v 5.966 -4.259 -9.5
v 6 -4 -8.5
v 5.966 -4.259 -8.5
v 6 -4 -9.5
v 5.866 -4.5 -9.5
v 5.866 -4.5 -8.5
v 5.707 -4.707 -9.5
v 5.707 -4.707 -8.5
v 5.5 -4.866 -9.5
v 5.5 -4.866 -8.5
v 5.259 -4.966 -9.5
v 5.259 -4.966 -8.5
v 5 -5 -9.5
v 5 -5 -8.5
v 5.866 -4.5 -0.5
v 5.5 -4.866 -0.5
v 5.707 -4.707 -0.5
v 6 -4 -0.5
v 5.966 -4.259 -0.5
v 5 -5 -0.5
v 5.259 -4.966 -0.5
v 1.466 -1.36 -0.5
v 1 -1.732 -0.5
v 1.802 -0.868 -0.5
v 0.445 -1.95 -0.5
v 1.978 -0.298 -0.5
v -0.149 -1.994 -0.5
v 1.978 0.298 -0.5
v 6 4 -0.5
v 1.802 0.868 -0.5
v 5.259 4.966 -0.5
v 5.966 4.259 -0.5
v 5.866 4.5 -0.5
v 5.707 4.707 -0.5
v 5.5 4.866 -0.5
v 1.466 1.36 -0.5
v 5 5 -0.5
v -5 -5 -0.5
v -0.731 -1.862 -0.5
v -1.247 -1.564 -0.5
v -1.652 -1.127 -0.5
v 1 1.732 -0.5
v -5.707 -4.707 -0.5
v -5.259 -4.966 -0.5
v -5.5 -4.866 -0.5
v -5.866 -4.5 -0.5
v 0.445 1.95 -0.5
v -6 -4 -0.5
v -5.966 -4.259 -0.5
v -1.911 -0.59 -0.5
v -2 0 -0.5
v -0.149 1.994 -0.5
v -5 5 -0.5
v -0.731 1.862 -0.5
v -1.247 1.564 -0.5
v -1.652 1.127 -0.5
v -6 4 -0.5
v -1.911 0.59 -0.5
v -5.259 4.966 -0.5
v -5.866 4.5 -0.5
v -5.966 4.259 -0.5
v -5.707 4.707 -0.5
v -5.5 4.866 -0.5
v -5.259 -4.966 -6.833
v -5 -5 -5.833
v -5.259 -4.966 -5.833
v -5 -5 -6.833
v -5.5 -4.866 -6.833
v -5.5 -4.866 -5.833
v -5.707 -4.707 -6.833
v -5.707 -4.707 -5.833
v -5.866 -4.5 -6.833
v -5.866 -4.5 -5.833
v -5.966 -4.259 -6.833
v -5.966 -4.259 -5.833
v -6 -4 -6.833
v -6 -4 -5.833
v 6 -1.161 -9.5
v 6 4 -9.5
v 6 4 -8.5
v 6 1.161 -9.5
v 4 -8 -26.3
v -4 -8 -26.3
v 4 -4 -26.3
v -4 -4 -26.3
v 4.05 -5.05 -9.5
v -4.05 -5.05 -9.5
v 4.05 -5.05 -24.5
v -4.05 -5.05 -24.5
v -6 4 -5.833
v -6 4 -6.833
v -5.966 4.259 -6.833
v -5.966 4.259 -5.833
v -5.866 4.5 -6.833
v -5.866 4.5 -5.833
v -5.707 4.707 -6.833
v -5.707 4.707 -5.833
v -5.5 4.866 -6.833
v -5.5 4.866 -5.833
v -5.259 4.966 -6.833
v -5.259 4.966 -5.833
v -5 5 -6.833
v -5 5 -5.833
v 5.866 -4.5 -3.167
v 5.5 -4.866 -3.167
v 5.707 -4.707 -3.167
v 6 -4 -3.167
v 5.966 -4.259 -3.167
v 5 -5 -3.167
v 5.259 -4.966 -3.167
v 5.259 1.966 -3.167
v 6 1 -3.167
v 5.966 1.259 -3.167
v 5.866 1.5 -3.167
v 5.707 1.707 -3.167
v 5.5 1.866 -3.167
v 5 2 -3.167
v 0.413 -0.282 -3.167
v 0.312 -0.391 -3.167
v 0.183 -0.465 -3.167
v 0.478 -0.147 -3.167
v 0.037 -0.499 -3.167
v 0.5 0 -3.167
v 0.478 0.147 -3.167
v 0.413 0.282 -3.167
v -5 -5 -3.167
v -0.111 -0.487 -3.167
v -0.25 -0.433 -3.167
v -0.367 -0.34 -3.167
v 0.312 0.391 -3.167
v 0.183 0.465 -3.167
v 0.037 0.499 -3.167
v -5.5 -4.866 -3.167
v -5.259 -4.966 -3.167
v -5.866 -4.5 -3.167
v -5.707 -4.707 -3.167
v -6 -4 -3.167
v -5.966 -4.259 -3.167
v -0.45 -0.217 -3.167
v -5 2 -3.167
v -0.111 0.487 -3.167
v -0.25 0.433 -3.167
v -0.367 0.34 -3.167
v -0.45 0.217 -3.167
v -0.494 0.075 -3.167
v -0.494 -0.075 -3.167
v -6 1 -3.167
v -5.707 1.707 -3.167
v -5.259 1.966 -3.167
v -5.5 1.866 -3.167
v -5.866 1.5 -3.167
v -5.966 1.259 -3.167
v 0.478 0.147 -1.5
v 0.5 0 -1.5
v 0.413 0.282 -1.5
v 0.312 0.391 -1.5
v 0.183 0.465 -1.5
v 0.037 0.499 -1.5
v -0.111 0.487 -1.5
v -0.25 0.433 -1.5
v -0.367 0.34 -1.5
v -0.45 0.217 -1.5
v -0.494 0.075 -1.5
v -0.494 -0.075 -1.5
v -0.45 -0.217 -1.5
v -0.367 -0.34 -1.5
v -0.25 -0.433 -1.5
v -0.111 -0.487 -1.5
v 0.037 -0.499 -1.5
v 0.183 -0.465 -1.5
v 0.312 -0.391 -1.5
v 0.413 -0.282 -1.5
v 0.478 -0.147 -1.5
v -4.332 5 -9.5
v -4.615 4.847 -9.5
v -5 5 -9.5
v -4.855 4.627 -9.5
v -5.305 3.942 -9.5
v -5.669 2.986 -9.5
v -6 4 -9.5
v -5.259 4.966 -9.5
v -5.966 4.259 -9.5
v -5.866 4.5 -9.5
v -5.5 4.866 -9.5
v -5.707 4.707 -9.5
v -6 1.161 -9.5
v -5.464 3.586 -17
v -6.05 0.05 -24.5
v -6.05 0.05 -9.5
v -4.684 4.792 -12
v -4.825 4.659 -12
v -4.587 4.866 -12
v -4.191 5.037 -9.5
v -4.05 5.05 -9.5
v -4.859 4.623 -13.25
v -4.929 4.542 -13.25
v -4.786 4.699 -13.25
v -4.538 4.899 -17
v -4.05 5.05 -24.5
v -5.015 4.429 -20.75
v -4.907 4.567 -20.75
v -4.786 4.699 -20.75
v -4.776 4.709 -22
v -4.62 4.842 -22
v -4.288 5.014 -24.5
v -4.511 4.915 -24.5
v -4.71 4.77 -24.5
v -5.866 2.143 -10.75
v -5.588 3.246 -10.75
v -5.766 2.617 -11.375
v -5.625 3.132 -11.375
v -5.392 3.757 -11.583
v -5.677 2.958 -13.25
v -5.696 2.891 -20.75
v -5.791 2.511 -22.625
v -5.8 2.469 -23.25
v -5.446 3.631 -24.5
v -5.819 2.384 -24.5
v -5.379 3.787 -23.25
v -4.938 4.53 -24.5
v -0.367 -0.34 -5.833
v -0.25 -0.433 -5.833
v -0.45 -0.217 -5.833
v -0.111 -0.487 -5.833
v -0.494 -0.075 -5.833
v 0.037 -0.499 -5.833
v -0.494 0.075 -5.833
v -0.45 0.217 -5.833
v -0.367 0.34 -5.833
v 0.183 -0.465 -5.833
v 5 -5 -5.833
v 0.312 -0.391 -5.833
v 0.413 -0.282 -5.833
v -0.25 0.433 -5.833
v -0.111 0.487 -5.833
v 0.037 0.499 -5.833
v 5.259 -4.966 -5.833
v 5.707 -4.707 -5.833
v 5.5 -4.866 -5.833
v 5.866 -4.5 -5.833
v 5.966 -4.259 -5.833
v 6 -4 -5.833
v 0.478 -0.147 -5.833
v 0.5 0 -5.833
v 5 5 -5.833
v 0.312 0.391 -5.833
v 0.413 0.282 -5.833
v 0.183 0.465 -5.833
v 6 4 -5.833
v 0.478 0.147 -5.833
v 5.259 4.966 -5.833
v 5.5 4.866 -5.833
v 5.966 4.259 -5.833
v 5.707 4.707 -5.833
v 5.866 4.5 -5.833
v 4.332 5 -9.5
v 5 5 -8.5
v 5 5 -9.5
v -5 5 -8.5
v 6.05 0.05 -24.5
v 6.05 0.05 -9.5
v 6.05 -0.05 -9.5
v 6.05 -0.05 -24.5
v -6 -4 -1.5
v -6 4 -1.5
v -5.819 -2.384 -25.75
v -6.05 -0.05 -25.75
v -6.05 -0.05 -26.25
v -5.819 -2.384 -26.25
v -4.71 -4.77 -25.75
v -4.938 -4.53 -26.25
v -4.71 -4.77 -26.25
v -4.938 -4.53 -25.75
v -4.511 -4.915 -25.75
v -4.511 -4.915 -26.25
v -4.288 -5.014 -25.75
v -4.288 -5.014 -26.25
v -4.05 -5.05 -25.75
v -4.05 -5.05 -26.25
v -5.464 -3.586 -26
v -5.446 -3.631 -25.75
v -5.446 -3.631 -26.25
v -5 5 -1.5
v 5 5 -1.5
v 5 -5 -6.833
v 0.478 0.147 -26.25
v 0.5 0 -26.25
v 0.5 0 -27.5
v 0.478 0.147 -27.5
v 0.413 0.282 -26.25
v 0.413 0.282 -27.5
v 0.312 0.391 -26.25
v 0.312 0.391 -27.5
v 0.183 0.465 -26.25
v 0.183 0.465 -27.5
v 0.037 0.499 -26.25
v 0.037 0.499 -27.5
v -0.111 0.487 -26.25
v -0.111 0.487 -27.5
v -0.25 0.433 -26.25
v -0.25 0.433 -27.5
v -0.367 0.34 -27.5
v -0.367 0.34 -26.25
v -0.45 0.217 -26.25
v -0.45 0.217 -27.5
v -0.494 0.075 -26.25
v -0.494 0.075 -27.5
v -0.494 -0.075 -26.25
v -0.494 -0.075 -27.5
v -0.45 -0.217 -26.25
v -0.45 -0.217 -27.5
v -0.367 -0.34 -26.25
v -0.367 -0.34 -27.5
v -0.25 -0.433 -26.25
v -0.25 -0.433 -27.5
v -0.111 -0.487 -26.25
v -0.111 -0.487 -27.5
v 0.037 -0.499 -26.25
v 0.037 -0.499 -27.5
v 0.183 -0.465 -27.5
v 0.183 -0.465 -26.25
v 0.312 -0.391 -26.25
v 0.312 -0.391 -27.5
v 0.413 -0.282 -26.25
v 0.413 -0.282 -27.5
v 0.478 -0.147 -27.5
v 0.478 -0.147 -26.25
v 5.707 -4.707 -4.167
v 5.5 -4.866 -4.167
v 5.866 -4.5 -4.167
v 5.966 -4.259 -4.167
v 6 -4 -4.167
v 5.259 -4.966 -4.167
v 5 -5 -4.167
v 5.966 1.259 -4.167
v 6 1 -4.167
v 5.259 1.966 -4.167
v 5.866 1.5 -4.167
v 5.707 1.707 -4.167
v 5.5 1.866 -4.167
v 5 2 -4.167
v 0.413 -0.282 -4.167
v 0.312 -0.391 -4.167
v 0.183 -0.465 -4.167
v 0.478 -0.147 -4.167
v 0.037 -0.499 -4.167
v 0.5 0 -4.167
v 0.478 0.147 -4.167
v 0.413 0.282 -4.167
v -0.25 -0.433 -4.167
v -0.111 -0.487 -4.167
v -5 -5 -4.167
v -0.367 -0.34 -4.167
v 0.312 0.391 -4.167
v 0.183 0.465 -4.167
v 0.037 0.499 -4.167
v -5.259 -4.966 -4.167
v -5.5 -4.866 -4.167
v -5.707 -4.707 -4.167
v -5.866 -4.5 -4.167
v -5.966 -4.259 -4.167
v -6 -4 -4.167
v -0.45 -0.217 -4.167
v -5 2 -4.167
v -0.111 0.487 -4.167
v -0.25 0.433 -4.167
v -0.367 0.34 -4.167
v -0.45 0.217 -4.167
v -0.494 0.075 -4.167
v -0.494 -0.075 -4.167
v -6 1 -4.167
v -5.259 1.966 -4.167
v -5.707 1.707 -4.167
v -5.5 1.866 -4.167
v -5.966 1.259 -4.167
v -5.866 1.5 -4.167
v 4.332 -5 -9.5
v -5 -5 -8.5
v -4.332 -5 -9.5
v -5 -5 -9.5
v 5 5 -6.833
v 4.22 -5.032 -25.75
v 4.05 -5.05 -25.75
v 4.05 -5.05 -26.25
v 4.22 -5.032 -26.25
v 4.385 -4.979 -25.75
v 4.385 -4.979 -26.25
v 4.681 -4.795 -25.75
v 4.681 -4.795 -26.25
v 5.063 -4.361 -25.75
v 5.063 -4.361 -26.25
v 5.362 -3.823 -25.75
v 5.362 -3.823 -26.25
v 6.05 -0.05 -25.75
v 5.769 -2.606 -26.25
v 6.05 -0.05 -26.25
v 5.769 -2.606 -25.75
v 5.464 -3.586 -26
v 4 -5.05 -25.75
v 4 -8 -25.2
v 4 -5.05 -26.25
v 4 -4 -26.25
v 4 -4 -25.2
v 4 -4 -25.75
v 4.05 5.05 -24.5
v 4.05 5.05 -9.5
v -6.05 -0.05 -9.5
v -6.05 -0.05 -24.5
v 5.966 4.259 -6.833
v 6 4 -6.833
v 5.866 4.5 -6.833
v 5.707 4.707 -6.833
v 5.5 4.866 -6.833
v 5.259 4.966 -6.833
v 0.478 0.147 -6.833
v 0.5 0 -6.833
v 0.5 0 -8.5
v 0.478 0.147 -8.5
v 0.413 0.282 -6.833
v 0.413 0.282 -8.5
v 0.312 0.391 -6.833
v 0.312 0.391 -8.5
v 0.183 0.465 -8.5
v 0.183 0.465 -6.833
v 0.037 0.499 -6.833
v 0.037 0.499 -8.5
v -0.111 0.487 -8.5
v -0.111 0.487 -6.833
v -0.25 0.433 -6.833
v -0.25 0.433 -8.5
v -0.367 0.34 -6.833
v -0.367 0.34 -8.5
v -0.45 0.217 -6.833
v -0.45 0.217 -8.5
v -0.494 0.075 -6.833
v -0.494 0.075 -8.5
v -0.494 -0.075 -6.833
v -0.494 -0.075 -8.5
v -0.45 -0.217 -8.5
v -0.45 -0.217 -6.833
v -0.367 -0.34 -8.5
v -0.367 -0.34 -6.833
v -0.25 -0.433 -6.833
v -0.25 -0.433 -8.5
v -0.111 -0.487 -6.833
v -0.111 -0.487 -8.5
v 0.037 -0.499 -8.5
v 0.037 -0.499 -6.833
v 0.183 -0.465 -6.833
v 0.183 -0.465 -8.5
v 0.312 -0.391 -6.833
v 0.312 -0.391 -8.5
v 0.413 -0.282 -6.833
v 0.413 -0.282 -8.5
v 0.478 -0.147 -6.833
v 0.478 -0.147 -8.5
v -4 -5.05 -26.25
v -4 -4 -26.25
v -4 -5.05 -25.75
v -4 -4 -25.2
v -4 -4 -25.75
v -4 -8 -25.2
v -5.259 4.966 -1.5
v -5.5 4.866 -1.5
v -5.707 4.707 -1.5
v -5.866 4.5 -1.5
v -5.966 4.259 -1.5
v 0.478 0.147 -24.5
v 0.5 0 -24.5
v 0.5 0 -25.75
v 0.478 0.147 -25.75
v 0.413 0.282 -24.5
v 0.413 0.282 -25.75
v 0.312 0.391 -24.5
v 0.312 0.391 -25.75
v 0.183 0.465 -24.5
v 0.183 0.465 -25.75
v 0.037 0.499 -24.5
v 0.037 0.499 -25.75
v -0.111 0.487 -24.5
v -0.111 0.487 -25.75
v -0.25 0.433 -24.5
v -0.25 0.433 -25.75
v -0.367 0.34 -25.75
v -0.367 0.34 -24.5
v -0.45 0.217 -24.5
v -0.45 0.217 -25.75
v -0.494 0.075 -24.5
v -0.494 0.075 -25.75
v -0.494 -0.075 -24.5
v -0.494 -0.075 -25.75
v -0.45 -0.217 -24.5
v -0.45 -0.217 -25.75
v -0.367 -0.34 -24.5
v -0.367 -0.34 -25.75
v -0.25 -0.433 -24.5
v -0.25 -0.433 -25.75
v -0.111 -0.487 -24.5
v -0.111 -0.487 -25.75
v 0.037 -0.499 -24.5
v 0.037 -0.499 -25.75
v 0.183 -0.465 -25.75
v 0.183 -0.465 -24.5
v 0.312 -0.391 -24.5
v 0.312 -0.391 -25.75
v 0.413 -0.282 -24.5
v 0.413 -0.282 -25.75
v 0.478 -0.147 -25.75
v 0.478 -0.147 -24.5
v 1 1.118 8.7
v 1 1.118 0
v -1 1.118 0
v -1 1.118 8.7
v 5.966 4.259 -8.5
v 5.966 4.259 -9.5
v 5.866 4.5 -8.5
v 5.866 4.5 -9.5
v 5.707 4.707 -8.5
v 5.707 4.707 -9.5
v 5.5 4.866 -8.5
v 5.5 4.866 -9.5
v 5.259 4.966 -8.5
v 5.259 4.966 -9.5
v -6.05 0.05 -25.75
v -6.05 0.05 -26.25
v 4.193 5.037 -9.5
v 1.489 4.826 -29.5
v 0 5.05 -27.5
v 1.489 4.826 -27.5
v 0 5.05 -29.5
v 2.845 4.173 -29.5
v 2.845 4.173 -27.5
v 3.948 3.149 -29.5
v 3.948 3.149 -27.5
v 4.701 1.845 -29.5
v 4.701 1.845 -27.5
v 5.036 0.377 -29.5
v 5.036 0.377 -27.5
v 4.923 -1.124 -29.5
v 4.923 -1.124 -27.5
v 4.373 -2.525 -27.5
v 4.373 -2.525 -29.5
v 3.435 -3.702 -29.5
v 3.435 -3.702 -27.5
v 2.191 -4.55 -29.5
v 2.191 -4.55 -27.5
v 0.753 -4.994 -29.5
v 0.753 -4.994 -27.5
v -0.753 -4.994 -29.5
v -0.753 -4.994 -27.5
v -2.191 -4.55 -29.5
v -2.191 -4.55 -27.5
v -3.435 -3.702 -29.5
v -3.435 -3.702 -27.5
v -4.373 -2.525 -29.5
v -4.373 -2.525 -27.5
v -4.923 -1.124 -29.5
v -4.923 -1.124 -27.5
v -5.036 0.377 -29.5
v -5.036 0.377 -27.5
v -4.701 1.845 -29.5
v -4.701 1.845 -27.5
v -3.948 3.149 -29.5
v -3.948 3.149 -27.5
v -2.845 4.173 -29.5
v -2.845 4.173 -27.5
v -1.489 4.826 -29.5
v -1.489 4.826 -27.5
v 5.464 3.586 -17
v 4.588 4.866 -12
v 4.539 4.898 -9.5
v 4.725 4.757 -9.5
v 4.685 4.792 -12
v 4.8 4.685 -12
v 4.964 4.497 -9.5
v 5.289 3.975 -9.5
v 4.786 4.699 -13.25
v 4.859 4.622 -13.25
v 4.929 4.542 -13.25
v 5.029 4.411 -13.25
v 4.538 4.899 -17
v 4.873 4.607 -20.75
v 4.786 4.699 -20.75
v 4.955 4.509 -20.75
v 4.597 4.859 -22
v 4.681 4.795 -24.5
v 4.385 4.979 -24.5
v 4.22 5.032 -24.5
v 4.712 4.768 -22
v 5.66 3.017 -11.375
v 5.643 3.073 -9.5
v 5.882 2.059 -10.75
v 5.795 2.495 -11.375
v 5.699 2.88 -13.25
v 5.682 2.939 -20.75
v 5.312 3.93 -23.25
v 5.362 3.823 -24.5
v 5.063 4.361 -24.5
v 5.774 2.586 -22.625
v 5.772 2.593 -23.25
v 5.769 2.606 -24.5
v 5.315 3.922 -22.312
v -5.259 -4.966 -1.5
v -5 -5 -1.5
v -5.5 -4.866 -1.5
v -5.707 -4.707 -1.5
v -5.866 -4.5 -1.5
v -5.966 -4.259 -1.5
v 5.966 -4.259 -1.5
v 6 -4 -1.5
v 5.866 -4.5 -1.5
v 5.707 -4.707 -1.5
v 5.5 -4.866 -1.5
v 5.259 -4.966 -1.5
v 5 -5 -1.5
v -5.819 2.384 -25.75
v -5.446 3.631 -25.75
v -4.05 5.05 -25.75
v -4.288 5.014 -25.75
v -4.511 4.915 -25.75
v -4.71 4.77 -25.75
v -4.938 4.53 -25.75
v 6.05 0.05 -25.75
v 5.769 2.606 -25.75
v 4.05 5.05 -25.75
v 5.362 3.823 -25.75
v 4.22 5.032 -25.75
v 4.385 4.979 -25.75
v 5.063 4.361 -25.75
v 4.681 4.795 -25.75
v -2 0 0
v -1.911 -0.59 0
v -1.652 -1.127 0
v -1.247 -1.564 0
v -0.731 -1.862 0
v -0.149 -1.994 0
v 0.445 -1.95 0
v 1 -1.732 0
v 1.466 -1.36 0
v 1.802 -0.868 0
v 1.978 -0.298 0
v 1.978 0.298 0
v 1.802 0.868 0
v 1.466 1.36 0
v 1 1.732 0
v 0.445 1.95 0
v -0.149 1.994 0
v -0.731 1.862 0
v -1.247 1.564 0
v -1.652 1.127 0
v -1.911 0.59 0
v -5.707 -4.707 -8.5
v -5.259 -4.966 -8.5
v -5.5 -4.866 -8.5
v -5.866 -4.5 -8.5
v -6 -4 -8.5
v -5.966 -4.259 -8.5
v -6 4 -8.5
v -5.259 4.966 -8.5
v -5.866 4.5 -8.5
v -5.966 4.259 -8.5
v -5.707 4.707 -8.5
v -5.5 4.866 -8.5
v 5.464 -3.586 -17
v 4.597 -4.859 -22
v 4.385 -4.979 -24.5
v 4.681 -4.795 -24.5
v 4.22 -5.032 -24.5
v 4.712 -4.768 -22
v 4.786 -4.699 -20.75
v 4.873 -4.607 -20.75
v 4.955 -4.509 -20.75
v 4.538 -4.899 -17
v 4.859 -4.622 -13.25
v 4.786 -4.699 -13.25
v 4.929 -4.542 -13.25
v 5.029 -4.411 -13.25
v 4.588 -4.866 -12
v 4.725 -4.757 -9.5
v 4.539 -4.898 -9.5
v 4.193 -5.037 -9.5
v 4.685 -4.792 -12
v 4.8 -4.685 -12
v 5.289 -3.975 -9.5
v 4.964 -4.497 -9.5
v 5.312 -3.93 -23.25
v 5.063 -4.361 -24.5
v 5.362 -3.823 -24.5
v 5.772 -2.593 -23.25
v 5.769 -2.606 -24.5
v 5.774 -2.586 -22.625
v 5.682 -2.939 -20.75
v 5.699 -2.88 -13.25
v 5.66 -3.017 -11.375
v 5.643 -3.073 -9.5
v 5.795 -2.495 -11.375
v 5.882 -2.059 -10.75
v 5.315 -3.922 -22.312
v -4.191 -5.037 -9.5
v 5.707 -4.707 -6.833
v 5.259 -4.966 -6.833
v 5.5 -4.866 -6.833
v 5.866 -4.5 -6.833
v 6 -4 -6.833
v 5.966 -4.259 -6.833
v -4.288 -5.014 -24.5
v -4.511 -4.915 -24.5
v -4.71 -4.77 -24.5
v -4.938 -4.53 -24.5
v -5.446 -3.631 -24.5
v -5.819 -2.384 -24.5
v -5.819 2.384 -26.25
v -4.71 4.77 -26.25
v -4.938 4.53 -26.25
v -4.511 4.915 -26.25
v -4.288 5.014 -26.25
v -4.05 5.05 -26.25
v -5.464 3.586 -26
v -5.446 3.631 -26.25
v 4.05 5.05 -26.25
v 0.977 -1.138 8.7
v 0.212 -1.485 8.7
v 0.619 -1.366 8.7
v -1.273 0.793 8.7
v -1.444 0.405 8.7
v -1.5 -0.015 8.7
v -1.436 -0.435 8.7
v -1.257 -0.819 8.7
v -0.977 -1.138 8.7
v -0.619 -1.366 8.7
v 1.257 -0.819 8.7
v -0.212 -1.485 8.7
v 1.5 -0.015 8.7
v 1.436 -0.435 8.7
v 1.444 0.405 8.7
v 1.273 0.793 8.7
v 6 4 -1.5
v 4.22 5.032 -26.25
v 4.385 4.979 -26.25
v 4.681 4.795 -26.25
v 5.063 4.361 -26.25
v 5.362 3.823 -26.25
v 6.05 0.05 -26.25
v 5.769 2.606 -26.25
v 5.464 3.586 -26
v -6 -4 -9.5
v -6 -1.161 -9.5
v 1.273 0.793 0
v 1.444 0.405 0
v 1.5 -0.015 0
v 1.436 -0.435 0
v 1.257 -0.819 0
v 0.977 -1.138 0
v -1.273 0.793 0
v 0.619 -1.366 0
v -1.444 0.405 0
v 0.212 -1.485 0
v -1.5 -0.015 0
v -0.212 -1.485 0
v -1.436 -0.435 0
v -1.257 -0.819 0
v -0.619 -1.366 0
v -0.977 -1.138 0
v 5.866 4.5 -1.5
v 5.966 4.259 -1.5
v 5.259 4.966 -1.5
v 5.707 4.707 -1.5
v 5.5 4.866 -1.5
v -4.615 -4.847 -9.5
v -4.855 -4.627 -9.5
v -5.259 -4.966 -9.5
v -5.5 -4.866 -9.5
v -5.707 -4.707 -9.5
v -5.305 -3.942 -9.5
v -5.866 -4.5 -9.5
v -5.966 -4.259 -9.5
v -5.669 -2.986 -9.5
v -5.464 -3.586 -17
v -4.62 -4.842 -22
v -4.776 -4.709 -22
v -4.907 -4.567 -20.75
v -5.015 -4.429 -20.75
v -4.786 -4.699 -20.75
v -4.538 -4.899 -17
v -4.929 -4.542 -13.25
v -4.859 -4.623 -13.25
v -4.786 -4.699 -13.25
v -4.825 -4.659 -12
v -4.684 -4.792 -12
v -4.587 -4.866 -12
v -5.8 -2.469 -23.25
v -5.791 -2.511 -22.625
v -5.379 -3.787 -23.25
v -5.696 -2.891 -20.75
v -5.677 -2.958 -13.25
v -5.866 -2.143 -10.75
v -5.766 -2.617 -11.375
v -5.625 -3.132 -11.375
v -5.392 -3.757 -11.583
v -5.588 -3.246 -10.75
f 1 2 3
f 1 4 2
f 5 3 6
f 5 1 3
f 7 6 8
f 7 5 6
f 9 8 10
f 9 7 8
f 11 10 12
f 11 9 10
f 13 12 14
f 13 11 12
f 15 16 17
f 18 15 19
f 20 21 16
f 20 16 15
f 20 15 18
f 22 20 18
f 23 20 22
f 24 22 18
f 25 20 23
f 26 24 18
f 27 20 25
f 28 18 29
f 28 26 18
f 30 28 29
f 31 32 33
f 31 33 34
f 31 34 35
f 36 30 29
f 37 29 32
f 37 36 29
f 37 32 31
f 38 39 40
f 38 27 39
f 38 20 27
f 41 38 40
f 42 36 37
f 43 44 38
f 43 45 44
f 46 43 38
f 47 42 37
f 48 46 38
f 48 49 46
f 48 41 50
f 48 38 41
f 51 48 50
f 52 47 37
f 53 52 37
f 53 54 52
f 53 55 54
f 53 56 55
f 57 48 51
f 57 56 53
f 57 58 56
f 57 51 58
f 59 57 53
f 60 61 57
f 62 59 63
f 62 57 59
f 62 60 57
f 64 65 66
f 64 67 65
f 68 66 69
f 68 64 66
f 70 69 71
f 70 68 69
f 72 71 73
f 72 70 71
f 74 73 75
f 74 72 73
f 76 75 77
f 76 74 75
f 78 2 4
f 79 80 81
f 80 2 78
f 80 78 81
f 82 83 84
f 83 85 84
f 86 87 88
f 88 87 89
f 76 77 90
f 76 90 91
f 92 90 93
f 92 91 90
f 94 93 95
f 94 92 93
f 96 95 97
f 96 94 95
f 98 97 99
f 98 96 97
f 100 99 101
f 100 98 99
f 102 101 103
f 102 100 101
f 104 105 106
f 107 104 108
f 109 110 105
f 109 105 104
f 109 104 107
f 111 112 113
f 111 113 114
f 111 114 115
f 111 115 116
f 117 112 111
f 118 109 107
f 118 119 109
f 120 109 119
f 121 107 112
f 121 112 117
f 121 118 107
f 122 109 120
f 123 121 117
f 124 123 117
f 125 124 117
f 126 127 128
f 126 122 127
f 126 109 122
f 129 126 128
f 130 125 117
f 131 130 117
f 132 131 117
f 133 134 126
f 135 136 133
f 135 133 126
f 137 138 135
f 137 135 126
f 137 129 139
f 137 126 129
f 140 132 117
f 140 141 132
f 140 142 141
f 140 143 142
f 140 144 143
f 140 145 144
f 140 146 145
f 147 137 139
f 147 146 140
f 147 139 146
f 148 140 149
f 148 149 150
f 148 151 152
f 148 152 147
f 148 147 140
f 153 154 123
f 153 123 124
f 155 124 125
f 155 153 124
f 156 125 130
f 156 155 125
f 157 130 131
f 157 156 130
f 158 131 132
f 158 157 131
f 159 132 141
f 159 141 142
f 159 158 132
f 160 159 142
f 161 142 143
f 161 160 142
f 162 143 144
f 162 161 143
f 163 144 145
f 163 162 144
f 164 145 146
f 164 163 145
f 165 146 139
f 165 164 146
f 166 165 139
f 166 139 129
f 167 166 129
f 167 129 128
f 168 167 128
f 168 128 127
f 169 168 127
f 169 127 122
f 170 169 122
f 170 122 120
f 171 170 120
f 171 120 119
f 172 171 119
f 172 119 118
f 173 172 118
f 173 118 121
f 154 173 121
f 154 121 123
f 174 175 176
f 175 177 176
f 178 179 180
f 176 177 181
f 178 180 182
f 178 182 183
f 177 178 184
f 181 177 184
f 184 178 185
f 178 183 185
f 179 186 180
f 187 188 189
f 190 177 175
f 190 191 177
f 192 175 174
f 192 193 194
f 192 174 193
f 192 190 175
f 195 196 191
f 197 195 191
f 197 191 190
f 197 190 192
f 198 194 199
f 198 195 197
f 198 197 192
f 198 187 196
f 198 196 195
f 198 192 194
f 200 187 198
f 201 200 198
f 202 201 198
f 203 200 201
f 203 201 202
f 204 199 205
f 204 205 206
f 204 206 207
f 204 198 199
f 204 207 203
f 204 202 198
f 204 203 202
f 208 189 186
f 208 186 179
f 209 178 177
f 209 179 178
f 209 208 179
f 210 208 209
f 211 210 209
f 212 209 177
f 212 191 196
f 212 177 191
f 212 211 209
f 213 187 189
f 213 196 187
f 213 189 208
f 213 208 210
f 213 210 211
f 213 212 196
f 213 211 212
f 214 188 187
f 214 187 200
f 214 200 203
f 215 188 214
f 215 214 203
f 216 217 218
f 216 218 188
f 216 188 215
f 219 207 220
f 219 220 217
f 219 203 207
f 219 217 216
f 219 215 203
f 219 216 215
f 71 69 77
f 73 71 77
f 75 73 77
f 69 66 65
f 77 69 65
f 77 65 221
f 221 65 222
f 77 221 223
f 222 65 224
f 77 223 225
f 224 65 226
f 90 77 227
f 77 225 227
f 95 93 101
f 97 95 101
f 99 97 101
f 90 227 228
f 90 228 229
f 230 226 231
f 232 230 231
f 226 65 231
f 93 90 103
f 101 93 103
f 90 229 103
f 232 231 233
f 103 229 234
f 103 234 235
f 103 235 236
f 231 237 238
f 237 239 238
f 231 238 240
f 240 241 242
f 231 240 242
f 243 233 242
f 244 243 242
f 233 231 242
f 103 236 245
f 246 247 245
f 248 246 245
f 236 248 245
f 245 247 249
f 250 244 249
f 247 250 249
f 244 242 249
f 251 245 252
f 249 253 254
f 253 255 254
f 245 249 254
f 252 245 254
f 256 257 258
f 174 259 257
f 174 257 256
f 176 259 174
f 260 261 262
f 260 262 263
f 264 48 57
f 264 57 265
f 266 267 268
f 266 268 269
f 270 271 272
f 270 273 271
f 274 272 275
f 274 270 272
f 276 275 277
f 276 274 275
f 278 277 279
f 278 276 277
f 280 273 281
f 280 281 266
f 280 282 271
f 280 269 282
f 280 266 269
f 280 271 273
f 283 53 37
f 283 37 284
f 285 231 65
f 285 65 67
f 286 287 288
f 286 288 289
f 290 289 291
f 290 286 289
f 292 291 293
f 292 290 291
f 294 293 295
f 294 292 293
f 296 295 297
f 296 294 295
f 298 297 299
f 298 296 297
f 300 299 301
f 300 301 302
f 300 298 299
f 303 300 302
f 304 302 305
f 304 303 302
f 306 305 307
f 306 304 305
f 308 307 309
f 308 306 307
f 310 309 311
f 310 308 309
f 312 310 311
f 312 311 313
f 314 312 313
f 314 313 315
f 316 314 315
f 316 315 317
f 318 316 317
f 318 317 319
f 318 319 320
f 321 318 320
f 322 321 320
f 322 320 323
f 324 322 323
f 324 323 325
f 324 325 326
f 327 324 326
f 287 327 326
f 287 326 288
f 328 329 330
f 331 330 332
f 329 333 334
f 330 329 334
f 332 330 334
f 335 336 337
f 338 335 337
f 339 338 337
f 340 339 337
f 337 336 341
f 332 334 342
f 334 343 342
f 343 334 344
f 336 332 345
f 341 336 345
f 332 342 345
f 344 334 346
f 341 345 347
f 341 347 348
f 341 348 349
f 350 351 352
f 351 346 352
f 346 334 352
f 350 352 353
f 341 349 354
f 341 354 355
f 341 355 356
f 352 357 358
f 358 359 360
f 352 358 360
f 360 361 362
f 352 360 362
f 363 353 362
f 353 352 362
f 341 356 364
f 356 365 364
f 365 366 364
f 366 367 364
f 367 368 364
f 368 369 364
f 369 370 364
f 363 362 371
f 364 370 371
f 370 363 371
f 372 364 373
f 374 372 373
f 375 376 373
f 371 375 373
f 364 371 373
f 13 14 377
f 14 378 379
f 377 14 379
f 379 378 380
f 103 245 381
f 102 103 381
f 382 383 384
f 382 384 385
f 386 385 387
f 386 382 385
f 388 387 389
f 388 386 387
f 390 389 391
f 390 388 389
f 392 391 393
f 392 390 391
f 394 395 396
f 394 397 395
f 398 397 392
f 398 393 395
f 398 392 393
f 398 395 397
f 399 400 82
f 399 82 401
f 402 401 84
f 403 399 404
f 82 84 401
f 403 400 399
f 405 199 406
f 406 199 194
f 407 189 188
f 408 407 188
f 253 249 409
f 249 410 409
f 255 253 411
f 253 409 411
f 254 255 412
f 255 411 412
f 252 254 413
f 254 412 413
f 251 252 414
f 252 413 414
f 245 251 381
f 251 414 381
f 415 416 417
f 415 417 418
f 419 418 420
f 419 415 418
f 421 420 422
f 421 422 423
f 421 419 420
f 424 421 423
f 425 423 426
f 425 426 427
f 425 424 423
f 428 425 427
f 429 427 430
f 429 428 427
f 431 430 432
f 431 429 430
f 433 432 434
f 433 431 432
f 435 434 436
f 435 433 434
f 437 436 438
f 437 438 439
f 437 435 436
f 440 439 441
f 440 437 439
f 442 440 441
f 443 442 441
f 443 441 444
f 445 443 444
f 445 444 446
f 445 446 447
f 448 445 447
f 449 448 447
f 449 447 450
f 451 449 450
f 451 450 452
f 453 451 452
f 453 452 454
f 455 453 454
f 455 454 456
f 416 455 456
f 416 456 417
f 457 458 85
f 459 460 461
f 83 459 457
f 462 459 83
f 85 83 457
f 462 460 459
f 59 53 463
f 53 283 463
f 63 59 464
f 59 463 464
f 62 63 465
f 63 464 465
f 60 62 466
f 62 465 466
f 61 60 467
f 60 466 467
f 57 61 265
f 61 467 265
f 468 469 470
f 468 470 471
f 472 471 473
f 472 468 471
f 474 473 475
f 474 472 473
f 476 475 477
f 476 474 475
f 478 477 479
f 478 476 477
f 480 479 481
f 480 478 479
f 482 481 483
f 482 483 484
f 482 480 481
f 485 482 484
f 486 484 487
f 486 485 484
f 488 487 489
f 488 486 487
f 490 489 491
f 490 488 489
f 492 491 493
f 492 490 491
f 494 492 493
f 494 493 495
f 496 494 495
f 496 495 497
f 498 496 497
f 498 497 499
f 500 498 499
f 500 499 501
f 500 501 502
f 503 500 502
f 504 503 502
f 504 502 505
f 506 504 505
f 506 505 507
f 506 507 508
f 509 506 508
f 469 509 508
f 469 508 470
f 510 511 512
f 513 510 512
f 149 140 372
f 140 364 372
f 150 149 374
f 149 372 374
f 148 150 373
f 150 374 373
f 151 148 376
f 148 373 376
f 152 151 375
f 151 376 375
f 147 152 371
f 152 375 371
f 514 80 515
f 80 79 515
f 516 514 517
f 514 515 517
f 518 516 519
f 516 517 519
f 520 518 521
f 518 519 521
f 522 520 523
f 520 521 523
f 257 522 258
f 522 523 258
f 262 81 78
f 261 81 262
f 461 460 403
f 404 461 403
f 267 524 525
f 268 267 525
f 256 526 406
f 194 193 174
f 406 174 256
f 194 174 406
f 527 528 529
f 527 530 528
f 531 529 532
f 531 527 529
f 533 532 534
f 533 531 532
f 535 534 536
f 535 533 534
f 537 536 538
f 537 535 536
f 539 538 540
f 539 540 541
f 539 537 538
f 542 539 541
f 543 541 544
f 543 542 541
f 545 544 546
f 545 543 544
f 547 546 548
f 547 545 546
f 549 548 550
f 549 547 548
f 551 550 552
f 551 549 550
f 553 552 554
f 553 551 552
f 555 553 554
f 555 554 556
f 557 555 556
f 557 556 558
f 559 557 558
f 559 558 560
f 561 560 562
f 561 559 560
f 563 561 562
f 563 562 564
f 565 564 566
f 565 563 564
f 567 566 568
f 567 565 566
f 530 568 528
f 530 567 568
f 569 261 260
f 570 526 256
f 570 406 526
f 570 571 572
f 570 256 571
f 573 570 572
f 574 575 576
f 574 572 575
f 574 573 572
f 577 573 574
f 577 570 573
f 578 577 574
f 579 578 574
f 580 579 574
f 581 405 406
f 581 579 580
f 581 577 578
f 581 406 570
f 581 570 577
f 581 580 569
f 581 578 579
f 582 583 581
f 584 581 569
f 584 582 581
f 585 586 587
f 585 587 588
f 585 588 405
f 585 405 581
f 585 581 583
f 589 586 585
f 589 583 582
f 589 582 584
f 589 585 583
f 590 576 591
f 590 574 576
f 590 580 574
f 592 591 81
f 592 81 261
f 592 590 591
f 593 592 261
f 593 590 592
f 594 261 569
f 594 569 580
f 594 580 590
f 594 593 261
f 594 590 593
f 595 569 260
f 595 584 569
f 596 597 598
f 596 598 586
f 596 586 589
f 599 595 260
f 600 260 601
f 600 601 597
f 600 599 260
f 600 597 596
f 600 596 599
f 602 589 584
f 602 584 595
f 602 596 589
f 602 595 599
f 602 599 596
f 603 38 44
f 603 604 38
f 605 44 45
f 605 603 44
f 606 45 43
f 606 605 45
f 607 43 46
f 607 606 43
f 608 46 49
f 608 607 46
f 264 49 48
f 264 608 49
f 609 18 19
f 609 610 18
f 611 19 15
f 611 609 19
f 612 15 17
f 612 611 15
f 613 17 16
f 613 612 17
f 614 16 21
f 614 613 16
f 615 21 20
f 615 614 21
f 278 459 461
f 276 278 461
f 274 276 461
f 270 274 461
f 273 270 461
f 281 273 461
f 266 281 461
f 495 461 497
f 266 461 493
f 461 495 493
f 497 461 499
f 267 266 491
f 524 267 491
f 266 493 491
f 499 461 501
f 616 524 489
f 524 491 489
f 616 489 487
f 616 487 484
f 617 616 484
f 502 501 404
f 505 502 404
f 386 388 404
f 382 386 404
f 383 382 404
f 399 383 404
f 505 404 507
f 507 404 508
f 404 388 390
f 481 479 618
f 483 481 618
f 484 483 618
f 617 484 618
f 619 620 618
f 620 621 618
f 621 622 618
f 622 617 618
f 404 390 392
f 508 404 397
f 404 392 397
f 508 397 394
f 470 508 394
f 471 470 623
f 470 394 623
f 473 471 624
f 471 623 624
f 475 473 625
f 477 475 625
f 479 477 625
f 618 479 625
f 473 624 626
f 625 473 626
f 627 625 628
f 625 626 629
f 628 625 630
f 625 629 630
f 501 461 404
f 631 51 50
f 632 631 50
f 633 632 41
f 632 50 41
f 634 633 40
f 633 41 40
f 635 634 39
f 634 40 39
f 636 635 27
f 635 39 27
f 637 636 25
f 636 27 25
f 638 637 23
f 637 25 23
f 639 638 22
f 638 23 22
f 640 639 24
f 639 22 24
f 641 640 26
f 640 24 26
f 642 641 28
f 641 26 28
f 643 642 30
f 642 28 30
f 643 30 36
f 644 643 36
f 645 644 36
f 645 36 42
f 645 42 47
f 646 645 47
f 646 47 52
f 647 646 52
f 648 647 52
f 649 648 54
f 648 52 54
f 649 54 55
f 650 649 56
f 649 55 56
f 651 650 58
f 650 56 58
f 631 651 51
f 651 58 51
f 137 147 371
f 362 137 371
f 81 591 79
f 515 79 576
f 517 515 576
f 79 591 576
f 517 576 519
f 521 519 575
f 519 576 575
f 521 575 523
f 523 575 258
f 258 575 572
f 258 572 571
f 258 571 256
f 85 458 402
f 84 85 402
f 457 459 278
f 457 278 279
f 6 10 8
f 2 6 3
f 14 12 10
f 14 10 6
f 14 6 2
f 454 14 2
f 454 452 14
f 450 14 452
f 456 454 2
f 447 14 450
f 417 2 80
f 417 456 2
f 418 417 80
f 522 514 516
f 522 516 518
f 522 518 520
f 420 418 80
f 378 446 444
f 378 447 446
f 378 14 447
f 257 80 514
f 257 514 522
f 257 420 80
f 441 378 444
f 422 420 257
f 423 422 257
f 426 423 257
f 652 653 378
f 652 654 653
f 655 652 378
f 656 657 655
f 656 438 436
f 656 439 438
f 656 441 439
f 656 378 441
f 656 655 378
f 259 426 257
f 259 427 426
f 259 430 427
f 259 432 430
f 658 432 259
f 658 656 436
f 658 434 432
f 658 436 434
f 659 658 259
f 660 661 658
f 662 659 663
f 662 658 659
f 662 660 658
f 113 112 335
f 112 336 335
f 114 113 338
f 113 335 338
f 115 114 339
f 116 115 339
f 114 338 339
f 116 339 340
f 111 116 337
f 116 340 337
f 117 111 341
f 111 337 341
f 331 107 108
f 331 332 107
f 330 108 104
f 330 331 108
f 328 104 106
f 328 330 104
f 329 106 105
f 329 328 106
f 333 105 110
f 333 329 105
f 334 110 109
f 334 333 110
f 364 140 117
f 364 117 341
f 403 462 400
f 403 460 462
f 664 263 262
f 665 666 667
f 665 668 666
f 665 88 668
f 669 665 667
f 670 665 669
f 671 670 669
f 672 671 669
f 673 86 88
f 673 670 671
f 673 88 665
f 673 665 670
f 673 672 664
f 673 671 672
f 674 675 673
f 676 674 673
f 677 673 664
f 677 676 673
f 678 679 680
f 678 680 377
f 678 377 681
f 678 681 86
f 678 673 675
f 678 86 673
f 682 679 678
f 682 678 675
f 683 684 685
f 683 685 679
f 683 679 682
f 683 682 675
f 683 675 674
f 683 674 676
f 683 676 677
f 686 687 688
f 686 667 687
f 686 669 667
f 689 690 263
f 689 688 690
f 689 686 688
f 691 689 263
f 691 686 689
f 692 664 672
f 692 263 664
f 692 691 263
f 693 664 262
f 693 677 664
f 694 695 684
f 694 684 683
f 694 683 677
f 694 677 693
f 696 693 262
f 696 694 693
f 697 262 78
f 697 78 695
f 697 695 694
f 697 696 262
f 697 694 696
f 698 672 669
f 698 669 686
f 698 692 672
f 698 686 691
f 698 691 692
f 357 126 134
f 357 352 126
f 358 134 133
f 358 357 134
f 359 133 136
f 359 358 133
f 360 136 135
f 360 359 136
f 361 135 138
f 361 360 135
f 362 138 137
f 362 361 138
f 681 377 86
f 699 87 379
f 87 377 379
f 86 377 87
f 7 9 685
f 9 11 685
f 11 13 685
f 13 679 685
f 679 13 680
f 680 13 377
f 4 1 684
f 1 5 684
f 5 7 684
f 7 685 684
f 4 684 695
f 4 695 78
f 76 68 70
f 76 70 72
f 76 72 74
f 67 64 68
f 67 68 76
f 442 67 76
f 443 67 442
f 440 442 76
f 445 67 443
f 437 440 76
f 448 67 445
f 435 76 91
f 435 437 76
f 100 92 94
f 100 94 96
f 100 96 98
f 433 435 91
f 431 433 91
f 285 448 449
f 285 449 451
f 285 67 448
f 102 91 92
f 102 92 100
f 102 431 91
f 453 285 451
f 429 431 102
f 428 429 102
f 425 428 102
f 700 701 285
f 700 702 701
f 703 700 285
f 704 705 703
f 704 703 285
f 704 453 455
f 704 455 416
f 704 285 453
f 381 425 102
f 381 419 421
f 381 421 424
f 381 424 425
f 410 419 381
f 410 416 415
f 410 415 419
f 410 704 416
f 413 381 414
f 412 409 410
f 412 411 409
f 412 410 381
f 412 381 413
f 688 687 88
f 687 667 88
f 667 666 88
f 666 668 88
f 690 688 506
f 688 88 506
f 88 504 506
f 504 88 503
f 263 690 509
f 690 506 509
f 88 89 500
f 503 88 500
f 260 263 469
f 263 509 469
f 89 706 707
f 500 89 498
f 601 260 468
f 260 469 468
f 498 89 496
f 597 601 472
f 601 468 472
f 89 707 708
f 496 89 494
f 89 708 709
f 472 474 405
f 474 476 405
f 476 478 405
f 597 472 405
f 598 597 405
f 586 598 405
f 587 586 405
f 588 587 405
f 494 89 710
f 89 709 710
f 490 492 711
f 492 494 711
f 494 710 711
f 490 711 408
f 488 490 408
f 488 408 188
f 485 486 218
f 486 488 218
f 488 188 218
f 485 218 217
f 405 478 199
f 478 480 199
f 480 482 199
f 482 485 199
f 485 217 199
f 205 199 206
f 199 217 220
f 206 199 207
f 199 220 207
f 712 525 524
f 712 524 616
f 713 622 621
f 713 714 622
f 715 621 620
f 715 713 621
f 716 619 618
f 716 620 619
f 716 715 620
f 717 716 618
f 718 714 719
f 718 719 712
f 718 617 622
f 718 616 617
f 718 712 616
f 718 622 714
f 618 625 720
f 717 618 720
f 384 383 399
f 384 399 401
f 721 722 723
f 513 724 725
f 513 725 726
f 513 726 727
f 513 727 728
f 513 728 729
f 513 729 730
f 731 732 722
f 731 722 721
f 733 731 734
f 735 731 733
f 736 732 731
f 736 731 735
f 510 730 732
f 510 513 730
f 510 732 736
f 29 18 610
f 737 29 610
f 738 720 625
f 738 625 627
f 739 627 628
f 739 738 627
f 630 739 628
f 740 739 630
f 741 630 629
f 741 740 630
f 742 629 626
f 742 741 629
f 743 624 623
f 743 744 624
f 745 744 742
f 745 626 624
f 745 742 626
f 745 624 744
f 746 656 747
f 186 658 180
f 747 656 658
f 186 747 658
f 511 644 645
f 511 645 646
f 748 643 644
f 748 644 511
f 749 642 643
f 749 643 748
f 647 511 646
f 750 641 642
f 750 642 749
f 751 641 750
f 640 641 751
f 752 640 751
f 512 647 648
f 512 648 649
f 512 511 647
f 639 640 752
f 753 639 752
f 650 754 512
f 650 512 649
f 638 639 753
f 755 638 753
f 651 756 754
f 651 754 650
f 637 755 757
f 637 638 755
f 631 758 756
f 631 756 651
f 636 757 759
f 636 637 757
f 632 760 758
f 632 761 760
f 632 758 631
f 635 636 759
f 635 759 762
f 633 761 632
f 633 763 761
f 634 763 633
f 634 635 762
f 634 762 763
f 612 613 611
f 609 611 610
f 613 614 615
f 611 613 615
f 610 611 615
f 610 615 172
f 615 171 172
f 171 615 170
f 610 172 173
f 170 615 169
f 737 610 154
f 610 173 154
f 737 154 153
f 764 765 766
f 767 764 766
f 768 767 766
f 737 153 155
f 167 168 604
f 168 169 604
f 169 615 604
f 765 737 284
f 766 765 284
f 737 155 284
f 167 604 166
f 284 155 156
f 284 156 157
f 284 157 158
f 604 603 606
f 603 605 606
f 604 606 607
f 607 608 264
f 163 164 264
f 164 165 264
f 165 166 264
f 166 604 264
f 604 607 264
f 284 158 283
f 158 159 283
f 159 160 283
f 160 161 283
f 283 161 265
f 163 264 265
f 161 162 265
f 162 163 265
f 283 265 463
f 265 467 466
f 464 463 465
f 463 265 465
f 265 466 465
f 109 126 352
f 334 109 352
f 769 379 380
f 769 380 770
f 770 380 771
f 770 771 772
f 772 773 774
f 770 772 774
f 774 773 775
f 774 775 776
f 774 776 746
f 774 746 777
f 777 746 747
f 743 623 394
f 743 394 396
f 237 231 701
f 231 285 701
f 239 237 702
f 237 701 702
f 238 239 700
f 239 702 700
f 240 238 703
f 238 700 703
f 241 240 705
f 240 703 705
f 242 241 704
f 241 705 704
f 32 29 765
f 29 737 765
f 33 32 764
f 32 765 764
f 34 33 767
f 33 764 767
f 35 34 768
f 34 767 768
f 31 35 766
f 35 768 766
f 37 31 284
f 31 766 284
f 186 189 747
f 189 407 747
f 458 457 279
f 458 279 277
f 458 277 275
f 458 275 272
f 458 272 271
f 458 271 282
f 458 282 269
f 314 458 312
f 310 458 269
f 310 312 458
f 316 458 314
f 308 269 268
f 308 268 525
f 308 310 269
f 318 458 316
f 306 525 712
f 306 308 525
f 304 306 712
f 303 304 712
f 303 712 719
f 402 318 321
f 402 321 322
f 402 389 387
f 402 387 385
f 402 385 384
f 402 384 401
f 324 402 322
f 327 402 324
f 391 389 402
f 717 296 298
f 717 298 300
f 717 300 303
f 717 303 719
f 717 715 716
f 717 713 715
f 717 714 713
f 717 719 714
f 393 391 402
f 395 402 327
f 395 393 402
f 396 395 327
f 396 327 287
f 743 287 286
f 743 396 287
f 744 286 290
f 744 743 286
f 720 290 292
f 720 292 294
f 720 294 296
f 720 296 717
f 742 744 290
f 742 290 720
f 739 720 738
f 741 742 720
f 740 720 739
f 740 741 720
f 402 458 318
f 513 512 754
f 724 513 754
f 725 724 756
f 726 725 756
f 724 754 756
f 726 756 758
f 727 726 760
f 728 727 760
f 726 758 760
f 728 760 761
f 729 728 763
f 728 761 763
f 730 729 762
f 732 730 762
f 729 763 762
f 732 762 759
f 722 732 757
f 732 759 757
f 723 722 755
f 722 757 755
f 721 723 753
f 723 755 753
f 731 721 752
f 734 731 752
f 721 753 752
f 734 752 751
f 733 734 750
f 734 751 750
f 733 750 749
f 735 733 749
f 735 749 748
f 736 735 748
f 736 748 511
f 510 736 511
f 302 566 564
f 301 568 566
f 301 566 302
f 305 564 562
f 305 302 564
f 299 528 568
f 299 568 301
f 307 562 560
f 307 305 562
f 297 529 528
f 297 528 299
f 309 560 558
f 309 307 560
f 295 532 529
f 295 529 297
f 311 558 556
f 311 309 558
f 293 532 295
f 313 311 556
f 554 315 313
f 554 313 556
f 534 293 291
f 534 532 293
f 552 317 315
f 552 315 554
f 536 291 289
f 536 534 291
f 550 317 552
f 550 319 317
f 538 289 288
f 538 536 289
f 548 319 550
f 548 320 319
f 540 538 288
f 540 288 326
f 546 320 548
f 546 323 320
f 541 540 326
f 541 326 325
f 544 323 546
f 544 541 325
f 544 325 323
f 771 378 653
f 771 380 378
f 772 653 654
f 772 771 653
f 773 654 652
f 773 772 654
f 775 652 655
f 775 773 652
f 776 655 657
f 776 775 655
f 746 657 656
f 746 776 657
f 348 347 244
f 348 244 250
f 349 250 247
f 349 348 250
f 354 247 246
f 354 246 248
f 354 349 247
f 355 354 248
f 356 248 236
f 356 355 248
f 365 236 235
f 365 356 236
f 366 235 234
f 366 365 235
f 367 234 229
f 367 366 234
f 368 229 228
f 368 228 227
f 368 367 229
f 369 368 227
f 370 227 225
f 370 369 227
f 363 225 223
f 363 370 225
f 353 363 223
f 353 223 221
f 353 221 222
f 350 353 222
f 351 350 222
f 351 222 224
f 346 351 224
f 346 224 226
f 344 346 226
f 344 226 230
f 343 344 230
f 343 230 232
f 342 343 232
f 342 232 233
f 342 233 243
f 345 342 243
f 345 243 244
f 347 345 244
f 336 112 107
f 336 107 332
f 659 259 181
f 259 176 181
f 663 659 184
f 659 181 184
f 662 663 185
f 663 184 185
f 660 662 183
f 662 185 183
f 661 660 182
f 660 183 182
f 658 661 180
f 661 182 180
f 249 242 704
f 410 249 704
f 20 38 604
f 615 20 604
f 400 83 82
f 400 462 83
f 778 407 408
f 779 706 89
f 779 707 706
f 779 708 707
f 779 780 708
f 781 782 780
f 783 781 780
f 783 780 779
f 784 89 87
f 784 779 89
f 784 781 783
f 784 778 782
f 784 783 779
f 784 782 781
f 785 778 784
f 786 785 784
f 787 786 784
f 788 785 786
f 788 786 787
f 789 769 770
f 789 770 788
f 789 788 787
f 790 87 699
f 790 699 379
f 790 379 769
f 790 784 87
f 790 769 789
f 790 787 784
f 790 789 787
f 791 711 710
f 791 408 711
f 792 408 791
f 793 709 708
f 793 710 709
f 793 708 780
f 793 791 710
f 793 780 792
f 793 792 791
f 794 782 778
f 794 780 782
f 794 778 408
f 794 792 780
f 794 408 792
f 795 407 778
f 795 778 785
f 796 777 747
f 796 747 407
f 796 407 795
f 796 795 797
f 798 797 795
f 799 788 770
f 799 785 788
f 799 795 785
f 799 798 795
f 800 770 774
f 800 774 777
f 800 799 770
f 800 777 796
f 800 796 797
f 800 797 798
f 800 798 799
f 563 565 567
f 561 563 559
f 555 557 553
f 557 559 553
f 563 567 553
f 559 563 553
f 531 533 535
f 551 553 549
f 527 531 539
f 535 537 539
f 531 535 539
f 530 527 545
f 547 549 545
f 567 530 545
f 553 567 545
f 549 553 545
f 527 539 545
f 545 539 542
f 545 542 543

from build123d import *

# Parameters (mm, degrees)
BOSS_EXTRUDE1_DEPTH = 8.7
BOSS_EXTRUDE3_START = 8.7
SKETCH1_3_R         = 0.5
BOSS_EXTRUDE3_DEPTH = 38.2
SKETCH2_3_W         = 0.5
SKETCH2_3_H         = 10.1
BOSS_EXTRUDE4_DEPTH = 6.05
FILLET2_SIZE        = 5
FILLET2_SIZE_2      = 2
SKETCH2_W           = 1
SKETCH2_H           = 10
SKETCH2_H_2         = 7
BOSS_EXTRUDE2_DEPTH = 6
FILLET1_R           = 1
SKETCH2_5_W         = 2
SKETCH2_5_H         = 5.05
SKETCH3_R           = 2
BOSS_EXTRUDE5_DEPTH = 0.5
SKETCH4_W           = 8
SKETCH4_H           = 2.95
SKETCH4_H_2         = 1.05
BOSS_EXTRUDE6_DEPTH = 0.55


with BuildPart() as part:
    # Sketch1 → Boss-Extrude1 (new body)
    with BuildSketch(Plane.XY):
        with BuildLine():
            Line((1, 1.118033989), (-1, 1.118033989))
            ThreePointArc((-1, 1.118033989), (0, -1.5), (1, 1.118033989))
        make_face()
    extrude(amount=BOSS_EXTRUDE1_DEPTH)

    # Sketch1<3> → Boss-Extrude3 (add)
    with BuildSketch(Plane.XY.offset(BOSS_EXTRUDE3_START)):
        Circle(SKETCH1_3_R)
    extrude(amount=-BOSS_EXTRUDE3_DEPTH)

    # Sketch2<3> → Boss-Extrude4 (add, symmetric)
    with BuildSketch(Plane(origin=(0, 0, 0), x_dir=(0, 0, -1), z_dir=(1, 0, 0))):
        Polygon((9.5, 5.05), (9.5, 5), (9.5, -5), (9.5, -5.05), (24.5, -5.05), (24.5, 0), (24.5, 5.05), align=None)
        with Locations((26, 0)):
            Rectangle(SKETCH2_3_W, SKETCH2_3_H)
    extrude(amount=BOSS_EXTRUDE4_DEPTH, both=True)

    # Fillet2
    # an asymmetric fillet: 5, 2 mm, written as the material it takes off along each edge
    with BuildSketch(Plane(origin=(-6.05, -5.05, 3), x_dir=(0, 1, 0), z_dir=(0, 0, -1)), Plane(origin=(-6.05, 5.05, -37), x_dir=(0, -1, 0), z_dir=(0, 0, 1))) as fillet2_piece_1:
        with BuildLine():
            Bezier((FILLET2_SIZE, 0), (0, 0), (0, FILLET2_SIZE_2), weights=[1, 0.707106781, 1])
            Line((0, FILLET2_SIZE_2), (0, 0))
            Line((0, 0), (FILLET2_SIZE, 0))
        make_face()
    extrude(amount=40, mode=Mode.SUBTRACT)
    with BuildSketch(Plane(origin=(6.05, -5.05, 3), x_dir=(-1, 0, 0), z_dir=(0, 0, -1)), Plane(origin=(6.05, 5.05, -37), x_dir=(-1, 0, 0), z_dir=(0, 0, 1))) as fillet2_piece_2:
        with BuildLine():
            Bezier((FILLET2_SIZE_2, 0), (0, 0), (0, FILLET2_SIZE), weights=[1, 0.707106781, 1])
            Line((0, FILLET2_SIZE), (0, 0))
            Line((0, 0), (FILLET2_SIZE_2, 0))
        make_face()
    extrude(amount=40, mode=Mode.SUBTRACT)
    with BuildSketch(Plane(origin=(-6.05, -5.05, -13.25), x_dir=(0, 1, 0), z_dir=(0, 0, -1)), Plane(origin=(-6.05, 5.05, -38.75), x_dir=(0, -1, 0), z_dir=(0, 0, 1))) as fillet2_piece_3:
        with BuildLine():
            Bezier((FILLET2_SIZE, 0), (0, 0), (0, FILLET2_SIZE_2), weights=[1, 0.707106781, 1])
            Line((0, FILLET2_SIZE_2), (0, 0))
            Line((0, 0), (FILLET2_SIZE, 0))
        make_face()
    extrude(amount=25.5, mode=Mode.SUBTRACT)
    with BuildSketch(Plane(origin=(6.05, -5.05, -13.25), x_dir=(-1, 0, 0), z_dir=(0, 0, -1)), Plane(origin=(6.05, 5.05, -38.75), x_dir=(-1, 0, 0), z_dir=(0, 0, 1))) as fillet2_piece_4:
        with BuildLine():
            Bezier((FILLET2_SIZE_2, 0), (0, 0), (0, FILLET2_SIZE), weights=[1, 0.707106781, 1])
            Line((0, FILLET2_SIZE), (0, 0))
            Line((0, 0), (FILLET2_SIZE_2, 0))
        make_face()
    extrude(amount=25.5, mode=Mode.SUBTRACT)

    # Sketch2 → Boss-Extrude2 (add, symmetric)
    with BuildSketch(Plane(origin=(0, 0, 0), x_dir=(0, 0, -1), z_dir=(1, 0, 0))):
        with Locations((1, 0)):
            Rectangle(SKETCH2_W, SKETCH2_H)
        with Locations((3.666666667, -1.5)):
            Rectangle(SKETCH2_W, SKETCH2_H_2)
        with Locations((9, 0)):
            Rectangle(SKETCH2_W, SKETCH2_H)
        with Locations((6.333333333, 0)):
            Rectangle(SKETCH2_W, SKETCH2_H)
    extrude(amount=BOSS_EXTRUDE2_DEPTH, both=True)

    # Fillet1
    fillet1_edges = [part.edges().sort_by_distance(p)[0] for p in [
        (-6, 5, -1),
        (6, 5, -1),
        (-6, -5, -1),
        (-6, -5, -3.666666667),
        (-6, -5, -6.333333333),
        (-6, -5, -9),
        (-6, 5, -9),
        (-6, 5, -6.333333333),
        (-6, 2, -3.666666667),
        (6, 5, -9),
        (6, 5, -6.333333333),
        (6, 2, -3.666666667),
        (6, -5, -9),
        (6, -5, -6.333333333),
        (6, -5, -3.666666667),
        (6, -5, -1),
    ]]
    fillet(fillet1_edges, radius=FILLET1_R)

    # Sketch2<5> → Revolve1 (revolve)
    with BuildSketch(Plane(origin=(0, 0, 0), x_dir=(0, 0, -1), z_dir=(1, 0, 0))):
        with Locations((28.5, 2.525)):
            Rectangle(SKETCH2_5_W, SKETCH2_5_H)
    revolve(axis=Axis((0, 0, -27.5), (0, 0, -1)))

    # Sketch3 → Boss-Extrude5 (add)
    with BuildSketch(Plane.XY.offset(-0.5)):
        with Locations(Location((0, 0, 0), (0, 0, 180))):
            Circle(SKETCH3_R)
    extrude(amount=BOSS_EXTRUDE5_DEPTH)

    # Sketch4 → Boss-Extrude6 (add, symmetric)
    with BuildSketch(Plane.XY.offset(-25.75)):
        with Locations((0, -6.525)):
            Rectangle(SKETCH4_W, SKETCH4_H)
        with Locations((0, -4.525)):
            Rectangle(SKETCH4_W, SKETCH4_H_2)
    extrude(amount=BOSS_EXTRUDE6_DEPTH, both=True)


solid = part.part
